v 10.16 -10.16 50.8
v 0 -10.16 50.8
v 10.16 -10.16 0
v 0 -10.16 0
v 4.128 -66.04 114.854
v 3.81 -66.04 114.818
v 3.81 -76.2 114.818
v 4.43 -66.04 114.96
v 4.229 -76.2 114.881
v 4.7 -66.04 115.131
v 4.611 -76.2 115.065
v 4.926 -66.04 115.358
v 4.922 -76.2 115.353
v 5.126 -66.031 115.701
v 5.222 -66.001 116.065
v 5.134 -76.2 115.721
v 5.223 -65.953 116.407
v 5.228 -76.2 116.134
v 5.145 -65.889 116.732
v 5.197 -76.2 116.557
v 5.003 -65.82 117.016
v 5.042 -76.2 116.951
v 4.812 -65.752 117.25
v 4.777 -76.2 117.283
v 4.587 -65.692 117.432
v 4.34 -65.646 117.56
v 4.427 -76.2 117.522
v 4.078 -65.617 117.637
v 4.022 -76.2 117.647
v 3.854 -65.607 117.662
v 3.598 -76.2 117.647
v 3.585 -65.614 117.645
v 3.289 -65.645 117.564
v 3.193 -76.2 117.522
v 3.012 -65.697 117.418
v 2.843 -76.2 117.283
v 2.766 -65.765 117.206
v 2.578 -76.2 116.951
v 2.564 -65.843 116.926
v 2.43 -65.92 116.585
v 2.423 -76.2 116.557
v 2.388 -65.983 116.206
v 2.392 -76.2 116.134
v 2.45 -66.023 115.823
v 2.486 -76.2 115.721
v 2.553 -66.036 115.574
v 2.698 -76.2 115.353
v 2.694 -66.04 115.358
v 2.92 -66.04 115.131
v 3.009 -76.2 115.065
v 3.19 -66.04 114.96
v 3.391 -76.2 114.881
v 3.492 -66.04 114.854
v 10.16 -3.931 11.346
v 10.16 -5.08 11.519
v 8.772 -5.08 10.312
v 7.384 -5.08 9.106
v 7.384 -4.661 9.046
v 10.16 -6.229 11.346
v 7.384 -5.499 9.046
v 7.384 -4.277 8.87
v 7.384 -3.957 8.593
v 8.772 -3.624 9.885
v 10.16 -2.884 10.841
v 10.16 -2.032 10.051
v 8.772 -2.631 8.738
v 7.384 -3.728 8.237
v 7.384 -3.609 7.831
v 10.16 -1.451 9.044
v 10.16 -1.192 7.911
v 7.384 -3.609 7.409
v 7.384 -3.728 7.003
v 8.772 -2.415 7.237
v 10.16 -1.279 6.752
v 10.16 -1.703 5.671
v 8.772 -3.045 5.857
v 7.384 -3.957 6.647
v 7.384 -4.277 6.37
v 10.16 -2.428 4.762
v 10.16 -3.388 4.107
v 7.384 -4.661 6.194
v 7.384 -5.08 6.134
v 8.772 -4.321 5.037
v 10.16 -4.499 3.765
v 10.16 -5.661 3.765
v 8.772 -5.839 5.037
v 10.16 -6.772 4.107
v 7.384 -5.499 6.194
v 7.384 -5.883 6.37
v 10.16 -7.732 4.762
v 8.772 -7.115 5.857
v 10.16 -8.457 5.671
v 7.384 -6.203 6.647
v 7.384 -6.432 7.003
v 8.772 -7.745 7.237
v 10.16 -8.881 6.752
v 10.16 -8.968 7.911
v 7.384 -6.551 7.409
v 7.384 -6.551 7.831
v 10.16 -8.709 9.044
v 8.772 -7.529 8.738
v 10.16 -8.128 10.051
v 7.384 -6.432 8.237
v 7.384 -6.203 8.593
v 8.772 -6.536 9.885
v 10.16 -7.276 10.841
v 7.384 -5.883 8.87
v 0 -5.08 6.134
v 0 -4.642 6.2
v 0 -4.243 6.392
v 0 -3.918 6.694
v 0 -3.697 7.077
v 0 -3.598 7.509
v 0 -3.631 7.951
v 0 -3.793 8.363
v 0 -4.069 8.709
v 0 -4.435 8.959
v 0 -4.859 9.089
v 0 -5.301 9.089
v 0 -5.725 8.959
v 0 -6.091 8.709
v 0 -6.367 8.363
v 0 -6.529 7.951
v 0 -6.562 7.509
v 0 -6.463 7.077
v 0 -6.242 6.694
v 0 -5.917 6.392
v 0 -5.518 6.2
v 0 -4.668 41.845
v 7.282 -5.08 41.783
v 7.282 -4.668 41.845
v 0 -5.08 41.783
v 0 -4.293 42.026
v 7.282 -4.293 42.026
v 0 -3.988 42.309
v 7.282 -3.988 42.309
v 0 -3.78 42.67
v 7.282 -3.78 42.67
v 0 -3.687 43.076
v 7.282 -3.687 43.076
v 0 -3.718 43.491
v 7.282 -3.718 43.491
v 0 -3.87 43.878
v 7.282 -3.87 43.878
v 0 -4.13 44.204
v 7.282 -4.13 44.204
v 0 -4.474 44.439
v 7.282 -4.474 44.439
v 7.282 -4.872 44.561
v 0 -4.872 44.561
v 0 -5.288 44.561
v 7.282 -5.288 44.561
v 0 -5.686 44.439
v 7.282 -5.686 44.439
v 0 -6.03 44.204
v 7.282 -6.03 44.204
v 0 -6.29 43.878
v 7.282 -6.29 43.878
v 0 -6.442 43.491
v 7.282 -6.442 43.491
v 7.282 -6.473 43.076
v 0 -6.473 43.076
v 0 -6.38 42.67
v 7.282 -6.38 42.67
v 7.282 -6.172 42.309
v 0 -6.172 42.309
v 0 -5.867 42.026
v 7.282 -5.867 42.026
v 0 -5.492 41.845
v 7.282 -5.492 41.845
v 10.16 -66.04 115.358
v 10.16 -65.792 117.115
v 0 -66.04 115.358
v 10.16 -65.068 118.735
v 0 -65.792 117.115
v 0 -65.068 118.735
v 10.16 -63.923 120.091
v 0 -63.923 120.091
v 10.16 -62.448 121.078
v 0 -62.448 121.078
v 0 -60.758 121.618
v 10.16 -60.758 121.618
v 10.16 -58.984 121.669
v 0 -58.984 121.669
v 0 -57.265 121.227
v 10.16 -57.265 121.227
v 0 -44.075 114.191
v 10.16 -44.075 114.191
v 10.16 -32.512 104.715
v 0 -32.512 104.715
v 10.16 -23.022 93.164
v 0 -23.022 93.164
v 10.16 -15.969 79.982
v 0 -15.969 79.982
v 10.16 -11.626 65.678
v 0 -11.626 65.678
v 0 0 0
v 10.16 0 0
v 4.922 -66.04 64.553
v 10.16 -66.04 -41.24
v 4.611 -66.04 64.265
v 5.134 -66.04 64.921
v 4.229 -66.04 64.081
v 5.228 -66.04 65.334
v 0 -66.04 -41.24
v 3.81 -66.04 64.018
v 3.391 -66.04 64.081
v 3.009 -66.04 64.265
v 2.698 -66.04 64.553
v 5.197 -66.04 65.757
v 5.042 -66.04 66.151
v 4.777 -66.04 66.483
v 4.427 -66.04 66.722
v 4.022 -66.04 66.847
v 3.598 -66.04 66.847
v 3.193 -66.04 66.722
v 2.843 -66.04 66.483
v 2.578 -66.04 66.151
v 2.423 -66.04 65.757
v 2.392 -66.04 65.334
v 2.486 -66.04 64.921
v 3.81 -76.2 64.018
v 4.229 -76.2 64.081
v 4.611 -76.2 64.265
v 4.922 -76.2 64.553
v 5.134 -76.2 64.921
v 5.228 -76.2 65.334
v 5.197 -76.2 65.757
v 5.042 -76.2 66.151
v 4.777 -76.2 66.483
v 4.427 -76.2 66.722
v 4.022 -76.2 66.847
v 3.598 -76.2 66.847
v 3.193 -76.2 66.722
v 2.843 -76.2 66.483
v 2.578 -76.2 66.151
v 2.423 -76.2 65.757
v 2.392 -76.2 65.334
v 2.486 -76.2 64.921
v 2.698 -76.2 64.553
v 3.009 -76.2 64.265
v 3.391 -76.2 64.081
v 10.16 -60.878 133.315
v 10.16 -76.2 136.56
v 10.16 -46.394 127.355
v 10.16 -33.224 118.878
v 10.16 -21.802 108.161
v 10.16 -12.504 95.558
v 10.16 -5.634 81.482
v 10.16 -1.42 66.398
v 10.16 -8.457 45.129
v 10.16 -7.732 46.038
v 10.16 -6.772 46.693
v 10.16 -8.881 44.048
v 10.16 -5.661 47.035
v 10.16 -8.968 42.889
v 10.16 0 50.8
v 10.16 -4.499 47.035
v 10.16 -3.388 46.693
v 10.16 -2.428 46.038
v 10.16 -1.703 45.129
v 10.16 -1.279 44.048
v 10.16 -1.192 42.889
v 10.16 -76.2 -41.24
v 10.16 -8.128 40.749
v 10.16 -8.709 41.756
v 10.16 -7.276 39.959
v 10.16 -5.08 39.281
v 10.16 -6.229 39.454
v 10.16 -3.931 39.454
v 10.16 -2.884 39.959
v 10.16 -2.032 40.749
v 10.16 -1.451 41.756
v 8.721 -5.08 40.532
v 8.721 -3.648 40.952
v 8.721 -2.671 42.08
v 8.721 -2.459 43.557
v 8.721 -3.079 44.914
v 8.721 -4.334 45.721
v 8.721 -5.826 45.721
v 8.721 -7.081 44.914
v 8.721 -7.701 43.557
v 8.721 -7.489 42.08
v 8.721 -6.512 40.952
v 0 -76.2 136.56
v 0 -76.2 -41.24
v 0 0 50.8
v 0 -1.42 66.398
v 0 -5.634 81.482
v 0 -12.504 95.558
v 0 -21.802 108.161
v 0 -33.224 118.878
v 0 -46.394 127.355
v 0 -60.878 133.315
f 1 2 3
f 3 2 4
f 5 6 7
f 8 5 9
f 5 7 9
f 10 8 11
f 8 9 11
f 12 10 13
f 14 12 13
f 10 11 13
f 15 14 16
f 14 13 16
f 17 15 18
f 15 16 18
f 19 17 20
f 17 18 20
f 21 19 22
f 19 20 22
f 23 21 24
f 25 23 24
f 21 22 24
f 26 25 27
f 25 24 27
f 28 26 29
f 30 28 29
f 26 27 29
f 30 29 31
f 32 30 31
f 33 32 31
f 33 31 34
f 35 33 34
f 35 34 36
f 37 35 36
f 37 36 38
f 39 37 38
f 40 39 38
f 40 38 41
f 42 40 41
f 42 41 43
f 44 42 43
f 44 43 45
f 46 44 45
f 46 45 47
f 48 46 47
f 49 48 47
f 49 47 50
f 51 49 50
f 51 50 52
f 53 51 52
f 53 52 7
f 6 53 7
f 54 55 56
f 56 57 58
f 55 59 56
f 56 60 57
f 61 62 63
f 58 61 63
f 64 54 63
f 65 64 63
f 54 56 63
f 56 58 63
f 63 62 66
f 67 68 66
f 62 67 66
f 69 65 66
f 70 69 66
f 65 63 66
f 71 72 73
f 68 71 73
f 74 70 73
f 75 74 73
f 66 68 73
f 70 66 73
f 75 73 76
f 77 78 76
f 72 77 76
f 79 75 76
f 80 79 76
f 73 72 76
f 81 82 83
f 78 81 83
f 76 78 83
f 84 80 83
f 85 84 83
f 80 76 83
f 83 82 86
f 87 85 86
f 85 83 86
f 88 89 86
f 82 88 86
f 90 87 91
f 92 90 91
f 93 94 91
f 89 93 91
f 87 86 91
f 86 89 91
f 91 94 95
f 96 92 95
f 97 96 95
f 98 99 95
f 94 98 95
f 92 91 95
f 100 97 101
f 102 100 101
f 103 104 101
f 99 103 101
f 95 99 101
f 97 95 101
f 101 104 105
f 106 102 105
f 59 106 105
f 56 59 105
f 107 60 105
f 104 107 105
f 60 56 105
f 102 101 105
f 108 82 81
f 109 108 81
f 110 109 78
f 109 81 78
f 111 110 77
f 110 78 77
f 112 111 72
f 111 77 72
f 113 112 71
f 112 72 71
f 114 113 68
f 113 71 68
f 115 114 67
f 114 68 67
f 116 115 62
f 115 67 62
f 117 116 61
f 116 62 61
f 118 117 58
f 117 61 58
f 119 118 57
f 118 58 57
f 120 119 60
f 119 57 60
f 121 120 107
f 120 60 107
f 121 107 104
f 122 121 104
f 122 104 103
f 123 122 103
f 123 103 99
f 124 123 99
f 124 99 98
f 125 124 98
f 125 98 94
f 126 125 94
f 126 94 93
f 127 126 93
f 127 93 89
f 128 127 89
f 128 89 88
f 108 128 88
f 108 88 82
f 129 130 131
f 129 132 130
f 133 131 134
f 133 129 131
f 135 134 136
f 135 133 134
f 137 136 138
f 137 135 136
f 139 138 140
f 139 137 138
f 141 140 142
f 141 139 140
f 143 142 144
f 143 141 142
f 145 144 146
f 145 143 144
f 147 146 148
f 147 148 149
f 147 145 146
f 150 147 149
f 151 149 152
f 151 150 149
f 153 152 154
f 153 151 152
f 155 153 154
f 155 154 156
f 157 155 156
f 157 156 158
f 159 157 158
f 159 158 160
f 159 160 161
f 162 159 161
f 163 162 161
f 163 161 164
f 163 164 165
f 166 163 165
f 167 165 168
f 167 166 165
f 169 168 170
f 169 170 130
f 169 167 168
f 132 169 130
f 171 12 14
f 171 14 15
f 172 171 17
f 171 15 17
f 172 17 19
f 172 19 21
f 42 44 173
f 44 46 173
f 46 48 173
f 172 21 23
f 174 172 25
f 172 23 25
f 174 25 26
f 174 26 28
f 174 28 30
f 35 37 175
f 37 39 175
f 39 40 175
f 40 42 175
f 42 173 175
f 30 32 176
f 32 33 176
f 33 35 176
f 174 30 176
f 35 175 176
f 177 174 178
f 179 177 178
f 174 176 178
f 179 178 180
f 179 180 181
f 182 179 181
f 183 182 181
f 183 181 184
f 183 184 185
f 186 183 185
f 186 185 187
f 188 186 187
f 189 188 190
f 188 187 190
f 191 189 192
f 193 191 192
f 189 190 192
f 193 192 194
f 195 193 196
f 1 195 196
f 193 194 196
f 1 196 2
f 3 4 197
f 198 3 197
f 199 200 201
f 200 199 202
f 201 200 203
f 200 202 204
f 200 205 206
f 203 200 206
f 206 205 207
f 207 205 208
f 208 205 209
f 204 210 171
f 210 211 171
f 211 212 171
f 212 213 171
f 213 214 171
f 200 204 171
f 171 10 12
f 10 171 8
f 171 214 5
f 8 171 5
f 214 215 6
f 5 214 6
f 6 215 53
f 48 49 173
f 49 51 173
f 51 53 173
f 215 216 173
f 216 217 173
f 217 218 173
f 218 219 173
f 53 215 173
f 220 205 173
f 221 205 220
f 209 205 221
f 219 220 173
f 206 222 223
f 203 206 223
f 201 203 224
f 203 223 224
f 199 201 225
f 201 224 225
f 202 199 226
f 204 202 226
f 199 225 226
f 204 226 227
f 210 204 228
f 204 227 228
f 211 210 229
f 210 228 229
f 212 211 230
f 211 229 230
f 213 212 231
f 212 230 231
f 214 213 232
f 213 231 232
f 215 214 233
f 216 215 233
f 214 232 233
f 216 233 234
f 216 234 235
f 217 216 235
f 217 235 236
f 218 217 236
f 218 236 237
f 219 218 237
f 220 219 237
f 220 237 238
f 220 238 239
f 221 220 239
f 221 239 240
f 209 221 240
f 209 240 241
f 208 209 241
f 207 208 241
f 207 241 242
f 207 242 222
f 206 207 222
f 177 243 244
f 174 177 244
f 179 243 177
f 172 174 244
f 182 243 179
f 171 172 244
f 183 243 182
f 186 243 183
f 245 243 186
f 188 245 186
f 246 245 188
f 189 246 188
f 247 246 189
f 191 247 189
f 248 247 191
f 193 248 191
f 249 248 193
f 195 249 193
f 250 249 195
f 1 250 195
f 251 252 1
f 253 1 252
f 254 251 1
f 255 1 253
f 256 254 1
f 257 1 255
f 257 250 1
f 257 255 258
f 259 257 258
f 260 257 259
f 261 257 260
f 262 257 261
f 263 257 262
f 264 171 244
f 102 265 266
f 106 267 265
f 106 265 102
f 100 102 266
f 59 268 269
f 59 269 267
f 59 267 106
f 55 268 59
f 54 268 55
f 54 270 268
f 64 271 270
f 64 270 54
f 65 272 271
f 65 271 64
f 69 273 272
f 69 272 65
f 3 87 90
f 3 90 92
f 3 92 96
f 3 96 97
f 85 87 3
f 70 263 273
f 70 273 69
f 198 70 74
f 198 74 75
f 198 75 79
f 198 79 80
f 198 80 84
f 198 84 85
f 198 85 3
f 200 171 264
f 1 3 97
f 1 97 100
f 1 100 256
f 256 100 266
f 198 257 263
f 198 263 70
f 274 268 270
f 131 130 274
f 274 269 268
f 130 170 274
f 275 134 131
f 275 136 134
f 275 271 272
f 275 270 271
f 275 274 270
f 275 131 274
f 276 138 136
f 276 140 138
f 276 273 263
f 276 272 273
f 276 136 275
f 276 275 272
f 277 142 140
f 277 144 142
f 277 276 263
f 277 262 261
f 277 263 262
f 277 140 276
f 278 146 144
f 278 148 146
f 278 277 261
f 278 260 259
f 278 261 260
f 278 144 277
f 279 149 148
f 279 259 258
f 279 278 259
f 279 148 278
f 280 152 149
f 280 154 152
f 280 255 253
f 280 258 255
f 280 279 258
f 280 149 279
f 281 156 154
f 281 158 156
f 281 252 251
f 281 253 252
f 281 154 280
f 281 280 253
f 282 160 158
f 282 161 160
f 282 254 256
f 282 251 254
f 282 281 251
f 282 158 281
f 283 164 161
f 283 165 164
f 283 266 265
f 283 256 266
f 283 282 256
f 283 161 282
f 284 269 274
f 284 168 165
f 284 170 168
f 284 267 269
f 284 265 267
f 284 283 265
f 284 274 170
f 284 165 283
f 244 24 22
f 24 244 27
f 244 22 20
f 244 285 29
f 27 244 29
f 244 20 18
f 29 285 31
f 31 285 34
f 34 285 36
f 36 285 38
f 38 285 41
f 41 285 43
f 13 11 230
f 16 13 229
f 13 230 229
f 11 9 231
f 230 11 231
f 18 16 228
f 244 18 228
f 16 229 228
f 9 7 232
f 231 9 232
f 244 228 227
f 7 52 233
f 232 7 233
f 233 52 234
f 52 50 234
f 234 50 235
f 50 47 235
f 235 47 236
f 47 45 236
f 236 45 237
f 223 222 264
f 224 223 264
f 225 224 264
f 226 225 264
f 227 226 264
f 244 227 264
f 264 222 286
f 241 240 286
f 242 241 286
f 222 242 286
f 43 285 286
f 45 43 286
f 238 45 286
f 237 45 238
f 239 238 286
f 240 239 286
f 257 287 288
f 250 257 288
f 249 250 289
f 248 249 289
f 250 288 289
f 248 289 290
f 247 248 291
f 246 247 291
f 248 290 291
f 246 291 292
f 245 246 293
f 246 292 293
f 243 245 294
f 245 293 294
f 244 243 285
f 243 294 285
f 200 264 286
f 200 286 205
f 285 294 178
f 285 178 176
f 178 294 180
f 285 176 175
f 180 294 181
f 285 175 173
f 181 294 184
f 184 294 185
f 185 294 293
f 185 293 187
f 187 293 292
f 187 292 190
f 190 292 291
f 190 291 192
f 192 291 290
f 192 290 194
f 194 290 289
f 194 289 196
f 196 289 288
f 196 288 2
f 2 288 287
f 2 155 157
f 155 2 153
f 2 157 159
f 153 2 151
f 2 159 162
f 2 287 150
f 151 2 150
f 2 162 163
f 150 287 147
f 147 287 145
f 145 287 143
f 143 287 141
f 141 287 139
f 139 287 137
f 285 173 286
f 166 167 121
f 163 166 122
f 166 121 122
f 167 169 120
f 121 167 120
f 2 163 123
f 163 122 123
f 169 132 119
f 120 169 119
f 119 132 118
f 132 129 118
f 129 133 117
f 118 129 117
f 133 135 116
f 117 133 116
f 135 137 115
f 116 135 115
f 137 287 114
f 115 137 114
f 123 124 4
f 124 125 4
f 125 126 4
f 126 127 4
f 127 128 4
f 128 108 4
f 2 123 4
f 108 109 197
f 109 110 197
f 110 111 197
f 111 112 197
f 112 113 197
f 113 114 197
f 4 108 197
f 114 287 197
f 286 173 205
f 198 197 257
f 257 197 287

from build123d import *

# Parameters (mm, degrees)
BOSS_EXTRUDE1_DEPTH                               = 10.16
SKETCH2_R                                         = 1.4859
CUT_EXTRUDE2_DEPTH                                = 157.71111347
CUT_EXTRUDE3_REACH                                = 158.711
SKETCH3_R                                         = 1.4224
CSK_FOR_3_FLAT_HEAD_MACHINE_SCREW_100_D           = 2.794
CSK_FOR_3_FLAT_HEAD_MACHINE_SCREW_100_CSINK_D     = 7.7978
CSK_FOR_3_FLAT_HEAD_MACHINE_SCREW_100_CSINK_ANGLE = 82


with BuildPart() as part:
    # Sketch1 → Boss-Extrude1 (new body)
    with BuildSketch(Plane(origin=(0, 0, 0), x_dir=(0, 0, -1), z_dir=(1, 0, 0))):
        with BuildLine():
            Line((-136.560270522, -76.2), (41.239729478, -76.2))
            Line((41.239729478, -76.2), (41.239729478, -66.04))
            Line((41.239729478, -66.04), (-115.357986338, -66.04))
            ThreePointArc((-115.357986338, -66.04), (-120.636166121, -63.220342502), (-121.226894187, -57.265454545))
            ThreePointArc((-121.226894187, -57.265454545), (-93.164110025, -23.021842608), (-50.8, -10.16))
            Line((-50.8, -10.16), (0, -10.16))
            Line((0, -10.16), (0, 0))
            Line((0, 0), (-50.8, 0))
            ThreePointArc((-50.8, 0), (-108.161276136, -21.802013662), (-136.560270522, -76.2))
        make_face()
    extrude(amount=BOSS_EXTRUDE1_DEPTH)

    # Sketch2 → Cut-Extrude2 (cut, through all)
    with BuildSketch(Plane(origin=(10.16, 0, 0), x_dir=(0, 0, -1), z_dir=(1, 0, 0))):
        with Locations((-7.62, -5.08)):
            Circle(SKETCH2_R)
    extrude(amount=-CUT_EXTRUDE2_DEPTH, mode=Mode.SUBTRACT)

    # Sketch3 → Cut-Extrude3 (cut, up to next)
    with BuildSketch(Plane.XZ.offset(76.2), mode=Mode.PRIVATE) as cut_extrude3_sk1:
        with Locations(Location((3.81, 116.240270522, 0), (0, 0, 270))):
            Circle(SKETCH3_R)
    cut_extrude3_tool1 = extrude(cut_extrude3_sk1.sketch, amount=-CUT_EXTRUDE3_REACH, mode=Mode.PRIVATE) & part.part
    # Sketch3 → Cut-Extrude3 (cut, up to next)
    with BuildSketch(Plane.XZ.offset(76.2), mode=Mode.PRIVATE) as cut_extrude3_sk2:
        with Locations(Location((3.81, 65.440270522, 0), (0, 0, 270))):
            Circle(SKETCH3_R)
    cut_extrude3_tool2 = extrude(cut_extrude3_sk2.sketch, amount=-CUT_EXTRUDE3_REACH, mode=Mode.PRIVATE) & part.part
    add(cut_extrude3_tool1.solids().sort_by_distance((3.81, -76.2, 116.240271))[0], mode=Mode.SUBTRACT)
    add(cut_extrude3_tool2.solids().sort_by_distance((3.81, -76.2, 65.440271))[0], mode=Mode.SUBTRACT)

    # CSK for #3 Flat Head Machine Screw (100)1 (through all)
    with Locations(Plane(origin=(10.16, 0, 0), x_dir=(0, 0, -1), z_dir=(1, 0, 0))):
        with Locations((-7.62, -5.08)):
            csk_for_3_flat_head_machine_screw_100 = CounterSinkHole(CSK_FOR_3_FLAT_HEAD_MACHINE_SCREW_100_D / 2, CSK_FOR_3_FLAT_HEAD_MACHINE_SCREW_100_CSINK_D / 2, counter_sink_angle=CSK_FOR_3_FLAT_HEAD_MACHINE_SCREW_100_CSINK_ANGLE)

    # Mirror1: CSK for #3 Flat Head Machine Screw (100)1 across plane
    add(csk_for_3_flat_head_machine_screw_100.mirror(Plane(origin=(0, 0, 25.4), x_dir=(1, 0, 0), z_dir=(0, 0, -1))), mode=Mode.SUBTRACT)


solid = part.part
